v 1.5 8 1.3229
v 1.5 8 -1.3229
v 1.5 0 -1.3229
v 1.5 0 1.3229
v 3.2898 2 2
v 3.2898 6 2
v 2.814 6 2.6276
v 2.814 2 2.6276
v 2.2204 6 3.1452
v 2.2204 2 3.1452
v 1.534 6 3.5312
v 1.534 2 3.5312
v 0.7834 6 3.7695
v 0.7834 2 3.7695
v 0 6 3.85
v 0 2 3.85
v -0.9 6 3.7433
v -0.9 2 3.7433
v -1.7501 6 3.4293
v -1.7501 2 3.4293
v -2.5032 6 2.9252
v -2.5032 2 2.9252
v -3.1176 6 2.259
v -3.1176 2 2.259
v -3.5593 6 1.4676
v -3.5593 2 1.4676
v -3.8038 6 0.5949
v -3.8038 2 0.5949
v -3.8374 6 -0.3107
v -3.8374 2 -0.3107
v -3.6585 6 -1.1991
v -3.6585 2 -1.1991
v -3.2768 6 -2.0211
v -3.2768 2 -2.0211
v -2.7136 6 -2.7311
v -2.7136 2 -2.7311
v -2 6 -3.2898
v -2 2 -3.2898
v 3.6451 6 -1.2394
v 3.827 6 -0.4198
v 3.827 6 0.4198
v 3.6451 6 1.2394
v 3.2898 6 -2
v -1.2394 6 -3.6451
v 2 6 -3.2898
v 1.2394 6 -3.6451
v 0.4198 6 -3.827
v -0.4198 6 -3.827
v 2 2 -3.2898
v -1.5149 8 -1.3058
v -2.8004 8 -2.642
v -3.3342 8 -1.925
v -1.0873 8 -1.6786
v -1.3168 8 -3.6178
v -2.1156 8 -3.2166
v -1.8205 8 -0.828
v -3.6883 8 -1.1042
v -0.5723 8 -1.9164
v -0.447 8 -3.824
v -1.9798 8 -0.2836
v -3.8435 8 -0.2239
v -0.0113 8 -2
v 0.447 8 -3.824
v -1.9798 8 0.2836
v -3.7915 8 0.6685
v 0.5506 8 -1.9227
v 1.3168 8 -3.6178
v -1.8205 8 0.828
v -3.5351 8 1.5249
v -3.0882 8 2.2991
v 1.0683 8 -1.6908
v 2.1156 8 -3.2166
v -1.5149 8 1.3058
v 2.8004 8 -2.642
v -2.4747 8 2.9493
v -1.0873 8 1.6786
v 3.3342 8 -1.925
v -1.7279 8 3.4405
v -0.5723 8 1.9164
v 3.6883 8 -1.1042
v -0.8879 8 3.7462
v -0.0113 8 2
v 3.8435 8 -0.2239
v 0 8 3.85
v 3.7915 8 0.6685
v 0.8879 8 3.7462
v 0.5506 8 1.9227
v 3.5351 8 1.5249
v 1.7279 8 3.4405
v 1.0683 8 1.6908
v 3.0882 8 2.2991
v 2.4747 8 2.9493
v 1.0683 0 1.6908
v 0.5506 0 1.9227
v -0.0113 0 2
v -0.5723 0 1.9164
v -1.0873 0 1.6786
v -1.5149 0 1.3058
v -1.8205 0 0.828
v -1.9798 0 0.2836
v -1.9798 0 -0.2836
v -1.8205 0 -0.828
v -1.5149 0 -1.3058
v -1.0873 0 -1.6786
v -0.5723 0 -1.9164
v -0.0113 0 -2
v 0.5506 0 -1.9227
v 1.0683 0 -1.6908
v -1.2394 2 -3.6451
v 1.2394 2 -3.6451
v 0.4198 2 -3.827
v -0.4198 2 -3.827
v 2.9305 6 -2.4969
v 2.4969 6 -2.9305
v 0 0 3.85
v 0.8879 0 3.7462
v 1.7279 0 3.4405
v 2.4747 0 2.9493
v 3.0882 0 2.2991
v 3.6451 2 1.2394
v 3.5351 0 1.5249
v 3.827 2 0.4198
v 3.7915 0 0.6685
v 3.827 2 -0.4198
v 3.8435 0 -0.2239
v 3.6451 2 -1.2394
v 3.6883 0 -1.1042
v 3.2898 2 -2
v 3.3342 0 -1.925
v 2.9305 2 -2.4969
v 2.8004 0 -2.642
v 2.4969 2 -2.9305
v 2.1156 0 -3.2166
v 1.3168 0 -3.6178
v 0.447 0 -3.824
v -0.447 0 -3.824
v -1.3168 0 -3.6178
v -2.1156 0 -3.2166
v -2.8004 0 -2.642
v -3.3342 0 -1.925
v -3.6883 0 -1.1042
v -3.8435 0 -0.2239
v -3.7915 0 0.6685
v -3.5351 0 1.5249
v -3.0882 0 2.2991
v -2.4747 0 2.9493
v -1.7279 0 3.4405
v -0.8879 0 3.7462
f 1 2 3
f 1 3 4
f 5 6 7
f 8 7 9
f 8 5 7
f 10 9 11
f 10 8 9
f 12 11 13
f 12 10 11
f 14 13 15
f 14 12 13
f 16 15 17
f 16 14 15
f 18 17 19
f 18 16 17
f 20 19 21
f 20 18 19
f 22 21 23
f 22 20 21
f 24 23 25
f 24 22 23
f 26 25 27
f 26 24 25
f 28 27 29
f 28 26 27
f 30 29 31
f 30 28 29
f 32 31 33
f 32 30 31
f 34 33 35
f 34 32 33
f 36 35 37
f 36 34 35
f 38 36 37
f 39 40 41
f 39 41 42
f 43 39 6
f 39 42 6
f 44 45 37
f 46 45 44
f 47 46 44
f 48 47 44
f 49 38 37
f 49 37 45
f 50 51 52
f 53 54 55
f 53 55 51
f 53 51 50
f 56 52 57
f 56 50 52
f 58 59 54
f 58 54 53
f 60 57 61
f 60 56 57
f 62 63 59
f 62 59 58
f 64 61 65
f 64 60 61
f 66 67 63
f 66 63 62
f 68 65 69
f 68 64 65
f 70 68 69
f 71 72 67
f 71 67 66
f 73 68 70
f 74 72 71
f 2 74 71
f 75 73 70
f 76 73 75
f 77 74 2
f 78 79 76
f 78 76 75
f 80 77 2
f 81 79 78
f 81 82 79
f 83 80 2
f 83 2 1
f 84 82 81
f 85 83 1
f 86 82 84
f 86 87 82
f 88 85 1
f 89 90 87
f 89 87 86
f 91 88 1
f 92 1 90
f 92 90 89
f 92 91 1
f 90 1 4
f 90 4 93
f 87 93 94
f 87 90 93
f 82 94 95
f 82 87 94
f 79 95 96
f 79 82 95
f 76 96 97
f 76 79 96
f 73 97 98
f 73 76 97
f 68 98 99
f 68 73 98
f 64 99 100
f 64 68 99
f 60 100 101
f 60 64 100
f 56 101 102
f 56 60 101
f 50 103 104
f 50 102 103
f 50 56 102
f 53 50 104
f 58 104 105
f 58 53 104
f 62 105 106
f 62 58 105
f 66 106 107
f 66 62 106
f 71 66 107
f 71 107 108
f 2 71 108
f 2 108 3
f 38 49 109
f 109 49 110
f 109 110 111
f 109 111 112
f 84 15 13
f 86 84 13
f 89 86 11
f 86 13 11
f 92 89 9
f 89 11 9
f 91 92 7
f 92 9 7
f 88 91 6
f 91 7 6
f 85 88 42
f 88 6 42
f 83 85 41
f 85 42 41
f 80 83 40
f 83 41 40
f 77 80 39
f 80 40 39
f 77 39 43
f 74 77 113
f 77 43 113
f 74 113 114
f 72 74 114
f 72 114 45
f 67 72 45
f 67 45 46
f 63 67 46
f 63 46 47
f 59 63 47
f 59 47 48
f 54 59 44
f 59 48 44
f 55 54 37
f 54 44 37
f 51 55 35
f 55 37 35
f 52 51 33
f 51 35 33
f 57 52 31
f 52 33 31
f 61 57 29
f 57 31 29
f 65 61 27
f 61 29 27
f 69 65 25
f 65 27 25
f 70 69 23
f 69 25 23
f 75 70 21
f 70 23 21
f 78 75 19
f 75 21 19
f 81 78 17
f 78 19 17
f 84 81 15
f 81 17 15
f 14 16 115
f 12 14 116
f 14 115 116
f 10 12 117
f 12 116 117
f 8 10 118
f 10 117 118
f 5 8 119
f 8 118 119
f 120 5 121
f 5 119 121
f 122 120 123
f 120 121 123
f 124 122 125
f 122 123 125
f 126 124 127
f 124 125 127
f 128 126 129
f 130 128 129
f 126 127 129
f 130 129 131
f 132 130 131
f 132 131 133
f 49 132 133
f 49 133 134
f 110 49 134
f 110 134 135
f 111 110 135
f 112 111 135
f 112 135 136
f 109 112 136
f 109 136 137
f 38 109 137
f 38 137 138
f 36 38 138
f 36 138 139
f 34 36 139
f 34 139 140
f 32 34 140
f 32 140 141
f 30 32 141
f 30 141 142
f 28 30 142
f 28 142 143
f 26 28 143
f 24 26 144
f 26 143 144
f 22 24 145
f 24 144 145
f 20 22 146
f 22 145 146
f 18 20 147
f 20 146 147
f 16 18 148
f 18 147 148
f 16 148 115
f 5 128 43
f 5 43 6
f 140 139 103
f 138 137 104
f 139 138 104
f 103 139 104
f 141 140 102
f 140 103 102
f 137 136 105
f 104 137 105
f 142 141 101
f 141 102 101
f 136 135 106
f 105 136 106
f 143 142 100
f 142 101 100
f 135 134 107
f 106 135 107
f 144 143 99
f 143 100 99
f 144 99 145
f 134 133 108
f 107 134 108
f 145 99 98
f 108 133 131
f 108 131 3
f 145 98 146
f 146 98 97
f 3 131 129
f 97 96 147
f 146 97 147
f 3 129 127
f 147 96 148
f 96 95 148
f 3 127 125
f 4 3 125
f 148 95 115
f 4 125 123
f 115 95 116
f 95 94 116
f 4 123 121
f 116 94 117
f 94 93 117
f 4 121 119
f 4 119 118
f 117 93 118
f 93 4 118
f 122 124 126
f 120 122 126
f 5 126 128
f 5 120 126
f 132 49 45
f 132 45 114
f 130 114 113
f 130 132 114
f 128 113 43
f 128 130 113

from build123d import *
from build123d.topology import SkipClean

# Parameters (mm, degrees)
SKETCH1_R           = 3.85
BOSS_EXTRUDE1_DEPTH = 2
BOSS_EXTRUDE2_DEPTH = 4
SKETCH4_R           = 3.85
BOSS_EXTRUDE3_DEPTH = 2
CUT_EXTRUDE1_DEPTH  = 10.67703467


with BuildPart() as part:
    # Sketch1 → Boss-Extrude1 (new body)
    with BuildSketch(Plane(origin=(0, 0, 0), x_dir=(1, 0, 0), z_dir=(0, 1, 0))):
        with Locations(Location((0, 0, 0), (0, 0, 270))):
            Circle(SKETCH1_R)
    extrude(amount=BOSS_EXTRUDE1_DEPTH)

    # Sketch3 → Boss-Extrude2 (add)
    with SkipClean():  # the faces are left unmerged after this step: merging them gives an invalid solid
        with BuildSketch(Plane(origin=(0, 2, 0), x_dir=(1, 0, 0), z_dir=(0, 1, 0))):
            with BuildLine():
                Line((3.28975683, 2), (3.28975683, -2))
                ThreePointArc((3.28975683, -2), (-2.722361108, -2.722361108), (-2, 3.28975683))
                Line((-2, 3.28975683), (2, 3.28975683))
                ThreePointArc((2, 3.28975683), (2.722361108, 2.722361108), (3.28975683, 2))
            make_face()
        extrude(amount=BOSS_EXTRUDE2_DEPTH)

    # Sketch4 → Boss-Extrude3 (add)
    with SkipClean():  # the faces are left unmerged after this step: merging them gives an invalid solid
        with BuildSketch(Plane(origin=(0, 6, 0), x_dir=(1, 0, 0), z_dir=(0, 1, 0))):
            with Locations(Location((0, 0, 0), (0, 0, 270))):
                Circle(SKETCH4_R)
        extrude(amount=BOSS_EXTRUDE3_DEPTH)

    # Sketch5 → Cut-Extrude1 (cut, through all)
    with SkipClean():  # the faces are left unmerged after this step: merging them gives an invalid solid
        with BuildSketch(Plane(origin=(0, 8, 0), x_dir=(1, 0, 0), z_dir=(0, 1, 0))):
            with BuildLine():
                Line((1.5, 1.322875656), (1.5, -1.322875656))
                ThreePointArc((1.5, -1.322875656), (-2, 0), (1.5, 1.322875656))
            make_face()
        extrude(amount=-CUT_EXTRUDE1_DEPTH, mode=Mode.SUBTRACT)


solid = part.part
